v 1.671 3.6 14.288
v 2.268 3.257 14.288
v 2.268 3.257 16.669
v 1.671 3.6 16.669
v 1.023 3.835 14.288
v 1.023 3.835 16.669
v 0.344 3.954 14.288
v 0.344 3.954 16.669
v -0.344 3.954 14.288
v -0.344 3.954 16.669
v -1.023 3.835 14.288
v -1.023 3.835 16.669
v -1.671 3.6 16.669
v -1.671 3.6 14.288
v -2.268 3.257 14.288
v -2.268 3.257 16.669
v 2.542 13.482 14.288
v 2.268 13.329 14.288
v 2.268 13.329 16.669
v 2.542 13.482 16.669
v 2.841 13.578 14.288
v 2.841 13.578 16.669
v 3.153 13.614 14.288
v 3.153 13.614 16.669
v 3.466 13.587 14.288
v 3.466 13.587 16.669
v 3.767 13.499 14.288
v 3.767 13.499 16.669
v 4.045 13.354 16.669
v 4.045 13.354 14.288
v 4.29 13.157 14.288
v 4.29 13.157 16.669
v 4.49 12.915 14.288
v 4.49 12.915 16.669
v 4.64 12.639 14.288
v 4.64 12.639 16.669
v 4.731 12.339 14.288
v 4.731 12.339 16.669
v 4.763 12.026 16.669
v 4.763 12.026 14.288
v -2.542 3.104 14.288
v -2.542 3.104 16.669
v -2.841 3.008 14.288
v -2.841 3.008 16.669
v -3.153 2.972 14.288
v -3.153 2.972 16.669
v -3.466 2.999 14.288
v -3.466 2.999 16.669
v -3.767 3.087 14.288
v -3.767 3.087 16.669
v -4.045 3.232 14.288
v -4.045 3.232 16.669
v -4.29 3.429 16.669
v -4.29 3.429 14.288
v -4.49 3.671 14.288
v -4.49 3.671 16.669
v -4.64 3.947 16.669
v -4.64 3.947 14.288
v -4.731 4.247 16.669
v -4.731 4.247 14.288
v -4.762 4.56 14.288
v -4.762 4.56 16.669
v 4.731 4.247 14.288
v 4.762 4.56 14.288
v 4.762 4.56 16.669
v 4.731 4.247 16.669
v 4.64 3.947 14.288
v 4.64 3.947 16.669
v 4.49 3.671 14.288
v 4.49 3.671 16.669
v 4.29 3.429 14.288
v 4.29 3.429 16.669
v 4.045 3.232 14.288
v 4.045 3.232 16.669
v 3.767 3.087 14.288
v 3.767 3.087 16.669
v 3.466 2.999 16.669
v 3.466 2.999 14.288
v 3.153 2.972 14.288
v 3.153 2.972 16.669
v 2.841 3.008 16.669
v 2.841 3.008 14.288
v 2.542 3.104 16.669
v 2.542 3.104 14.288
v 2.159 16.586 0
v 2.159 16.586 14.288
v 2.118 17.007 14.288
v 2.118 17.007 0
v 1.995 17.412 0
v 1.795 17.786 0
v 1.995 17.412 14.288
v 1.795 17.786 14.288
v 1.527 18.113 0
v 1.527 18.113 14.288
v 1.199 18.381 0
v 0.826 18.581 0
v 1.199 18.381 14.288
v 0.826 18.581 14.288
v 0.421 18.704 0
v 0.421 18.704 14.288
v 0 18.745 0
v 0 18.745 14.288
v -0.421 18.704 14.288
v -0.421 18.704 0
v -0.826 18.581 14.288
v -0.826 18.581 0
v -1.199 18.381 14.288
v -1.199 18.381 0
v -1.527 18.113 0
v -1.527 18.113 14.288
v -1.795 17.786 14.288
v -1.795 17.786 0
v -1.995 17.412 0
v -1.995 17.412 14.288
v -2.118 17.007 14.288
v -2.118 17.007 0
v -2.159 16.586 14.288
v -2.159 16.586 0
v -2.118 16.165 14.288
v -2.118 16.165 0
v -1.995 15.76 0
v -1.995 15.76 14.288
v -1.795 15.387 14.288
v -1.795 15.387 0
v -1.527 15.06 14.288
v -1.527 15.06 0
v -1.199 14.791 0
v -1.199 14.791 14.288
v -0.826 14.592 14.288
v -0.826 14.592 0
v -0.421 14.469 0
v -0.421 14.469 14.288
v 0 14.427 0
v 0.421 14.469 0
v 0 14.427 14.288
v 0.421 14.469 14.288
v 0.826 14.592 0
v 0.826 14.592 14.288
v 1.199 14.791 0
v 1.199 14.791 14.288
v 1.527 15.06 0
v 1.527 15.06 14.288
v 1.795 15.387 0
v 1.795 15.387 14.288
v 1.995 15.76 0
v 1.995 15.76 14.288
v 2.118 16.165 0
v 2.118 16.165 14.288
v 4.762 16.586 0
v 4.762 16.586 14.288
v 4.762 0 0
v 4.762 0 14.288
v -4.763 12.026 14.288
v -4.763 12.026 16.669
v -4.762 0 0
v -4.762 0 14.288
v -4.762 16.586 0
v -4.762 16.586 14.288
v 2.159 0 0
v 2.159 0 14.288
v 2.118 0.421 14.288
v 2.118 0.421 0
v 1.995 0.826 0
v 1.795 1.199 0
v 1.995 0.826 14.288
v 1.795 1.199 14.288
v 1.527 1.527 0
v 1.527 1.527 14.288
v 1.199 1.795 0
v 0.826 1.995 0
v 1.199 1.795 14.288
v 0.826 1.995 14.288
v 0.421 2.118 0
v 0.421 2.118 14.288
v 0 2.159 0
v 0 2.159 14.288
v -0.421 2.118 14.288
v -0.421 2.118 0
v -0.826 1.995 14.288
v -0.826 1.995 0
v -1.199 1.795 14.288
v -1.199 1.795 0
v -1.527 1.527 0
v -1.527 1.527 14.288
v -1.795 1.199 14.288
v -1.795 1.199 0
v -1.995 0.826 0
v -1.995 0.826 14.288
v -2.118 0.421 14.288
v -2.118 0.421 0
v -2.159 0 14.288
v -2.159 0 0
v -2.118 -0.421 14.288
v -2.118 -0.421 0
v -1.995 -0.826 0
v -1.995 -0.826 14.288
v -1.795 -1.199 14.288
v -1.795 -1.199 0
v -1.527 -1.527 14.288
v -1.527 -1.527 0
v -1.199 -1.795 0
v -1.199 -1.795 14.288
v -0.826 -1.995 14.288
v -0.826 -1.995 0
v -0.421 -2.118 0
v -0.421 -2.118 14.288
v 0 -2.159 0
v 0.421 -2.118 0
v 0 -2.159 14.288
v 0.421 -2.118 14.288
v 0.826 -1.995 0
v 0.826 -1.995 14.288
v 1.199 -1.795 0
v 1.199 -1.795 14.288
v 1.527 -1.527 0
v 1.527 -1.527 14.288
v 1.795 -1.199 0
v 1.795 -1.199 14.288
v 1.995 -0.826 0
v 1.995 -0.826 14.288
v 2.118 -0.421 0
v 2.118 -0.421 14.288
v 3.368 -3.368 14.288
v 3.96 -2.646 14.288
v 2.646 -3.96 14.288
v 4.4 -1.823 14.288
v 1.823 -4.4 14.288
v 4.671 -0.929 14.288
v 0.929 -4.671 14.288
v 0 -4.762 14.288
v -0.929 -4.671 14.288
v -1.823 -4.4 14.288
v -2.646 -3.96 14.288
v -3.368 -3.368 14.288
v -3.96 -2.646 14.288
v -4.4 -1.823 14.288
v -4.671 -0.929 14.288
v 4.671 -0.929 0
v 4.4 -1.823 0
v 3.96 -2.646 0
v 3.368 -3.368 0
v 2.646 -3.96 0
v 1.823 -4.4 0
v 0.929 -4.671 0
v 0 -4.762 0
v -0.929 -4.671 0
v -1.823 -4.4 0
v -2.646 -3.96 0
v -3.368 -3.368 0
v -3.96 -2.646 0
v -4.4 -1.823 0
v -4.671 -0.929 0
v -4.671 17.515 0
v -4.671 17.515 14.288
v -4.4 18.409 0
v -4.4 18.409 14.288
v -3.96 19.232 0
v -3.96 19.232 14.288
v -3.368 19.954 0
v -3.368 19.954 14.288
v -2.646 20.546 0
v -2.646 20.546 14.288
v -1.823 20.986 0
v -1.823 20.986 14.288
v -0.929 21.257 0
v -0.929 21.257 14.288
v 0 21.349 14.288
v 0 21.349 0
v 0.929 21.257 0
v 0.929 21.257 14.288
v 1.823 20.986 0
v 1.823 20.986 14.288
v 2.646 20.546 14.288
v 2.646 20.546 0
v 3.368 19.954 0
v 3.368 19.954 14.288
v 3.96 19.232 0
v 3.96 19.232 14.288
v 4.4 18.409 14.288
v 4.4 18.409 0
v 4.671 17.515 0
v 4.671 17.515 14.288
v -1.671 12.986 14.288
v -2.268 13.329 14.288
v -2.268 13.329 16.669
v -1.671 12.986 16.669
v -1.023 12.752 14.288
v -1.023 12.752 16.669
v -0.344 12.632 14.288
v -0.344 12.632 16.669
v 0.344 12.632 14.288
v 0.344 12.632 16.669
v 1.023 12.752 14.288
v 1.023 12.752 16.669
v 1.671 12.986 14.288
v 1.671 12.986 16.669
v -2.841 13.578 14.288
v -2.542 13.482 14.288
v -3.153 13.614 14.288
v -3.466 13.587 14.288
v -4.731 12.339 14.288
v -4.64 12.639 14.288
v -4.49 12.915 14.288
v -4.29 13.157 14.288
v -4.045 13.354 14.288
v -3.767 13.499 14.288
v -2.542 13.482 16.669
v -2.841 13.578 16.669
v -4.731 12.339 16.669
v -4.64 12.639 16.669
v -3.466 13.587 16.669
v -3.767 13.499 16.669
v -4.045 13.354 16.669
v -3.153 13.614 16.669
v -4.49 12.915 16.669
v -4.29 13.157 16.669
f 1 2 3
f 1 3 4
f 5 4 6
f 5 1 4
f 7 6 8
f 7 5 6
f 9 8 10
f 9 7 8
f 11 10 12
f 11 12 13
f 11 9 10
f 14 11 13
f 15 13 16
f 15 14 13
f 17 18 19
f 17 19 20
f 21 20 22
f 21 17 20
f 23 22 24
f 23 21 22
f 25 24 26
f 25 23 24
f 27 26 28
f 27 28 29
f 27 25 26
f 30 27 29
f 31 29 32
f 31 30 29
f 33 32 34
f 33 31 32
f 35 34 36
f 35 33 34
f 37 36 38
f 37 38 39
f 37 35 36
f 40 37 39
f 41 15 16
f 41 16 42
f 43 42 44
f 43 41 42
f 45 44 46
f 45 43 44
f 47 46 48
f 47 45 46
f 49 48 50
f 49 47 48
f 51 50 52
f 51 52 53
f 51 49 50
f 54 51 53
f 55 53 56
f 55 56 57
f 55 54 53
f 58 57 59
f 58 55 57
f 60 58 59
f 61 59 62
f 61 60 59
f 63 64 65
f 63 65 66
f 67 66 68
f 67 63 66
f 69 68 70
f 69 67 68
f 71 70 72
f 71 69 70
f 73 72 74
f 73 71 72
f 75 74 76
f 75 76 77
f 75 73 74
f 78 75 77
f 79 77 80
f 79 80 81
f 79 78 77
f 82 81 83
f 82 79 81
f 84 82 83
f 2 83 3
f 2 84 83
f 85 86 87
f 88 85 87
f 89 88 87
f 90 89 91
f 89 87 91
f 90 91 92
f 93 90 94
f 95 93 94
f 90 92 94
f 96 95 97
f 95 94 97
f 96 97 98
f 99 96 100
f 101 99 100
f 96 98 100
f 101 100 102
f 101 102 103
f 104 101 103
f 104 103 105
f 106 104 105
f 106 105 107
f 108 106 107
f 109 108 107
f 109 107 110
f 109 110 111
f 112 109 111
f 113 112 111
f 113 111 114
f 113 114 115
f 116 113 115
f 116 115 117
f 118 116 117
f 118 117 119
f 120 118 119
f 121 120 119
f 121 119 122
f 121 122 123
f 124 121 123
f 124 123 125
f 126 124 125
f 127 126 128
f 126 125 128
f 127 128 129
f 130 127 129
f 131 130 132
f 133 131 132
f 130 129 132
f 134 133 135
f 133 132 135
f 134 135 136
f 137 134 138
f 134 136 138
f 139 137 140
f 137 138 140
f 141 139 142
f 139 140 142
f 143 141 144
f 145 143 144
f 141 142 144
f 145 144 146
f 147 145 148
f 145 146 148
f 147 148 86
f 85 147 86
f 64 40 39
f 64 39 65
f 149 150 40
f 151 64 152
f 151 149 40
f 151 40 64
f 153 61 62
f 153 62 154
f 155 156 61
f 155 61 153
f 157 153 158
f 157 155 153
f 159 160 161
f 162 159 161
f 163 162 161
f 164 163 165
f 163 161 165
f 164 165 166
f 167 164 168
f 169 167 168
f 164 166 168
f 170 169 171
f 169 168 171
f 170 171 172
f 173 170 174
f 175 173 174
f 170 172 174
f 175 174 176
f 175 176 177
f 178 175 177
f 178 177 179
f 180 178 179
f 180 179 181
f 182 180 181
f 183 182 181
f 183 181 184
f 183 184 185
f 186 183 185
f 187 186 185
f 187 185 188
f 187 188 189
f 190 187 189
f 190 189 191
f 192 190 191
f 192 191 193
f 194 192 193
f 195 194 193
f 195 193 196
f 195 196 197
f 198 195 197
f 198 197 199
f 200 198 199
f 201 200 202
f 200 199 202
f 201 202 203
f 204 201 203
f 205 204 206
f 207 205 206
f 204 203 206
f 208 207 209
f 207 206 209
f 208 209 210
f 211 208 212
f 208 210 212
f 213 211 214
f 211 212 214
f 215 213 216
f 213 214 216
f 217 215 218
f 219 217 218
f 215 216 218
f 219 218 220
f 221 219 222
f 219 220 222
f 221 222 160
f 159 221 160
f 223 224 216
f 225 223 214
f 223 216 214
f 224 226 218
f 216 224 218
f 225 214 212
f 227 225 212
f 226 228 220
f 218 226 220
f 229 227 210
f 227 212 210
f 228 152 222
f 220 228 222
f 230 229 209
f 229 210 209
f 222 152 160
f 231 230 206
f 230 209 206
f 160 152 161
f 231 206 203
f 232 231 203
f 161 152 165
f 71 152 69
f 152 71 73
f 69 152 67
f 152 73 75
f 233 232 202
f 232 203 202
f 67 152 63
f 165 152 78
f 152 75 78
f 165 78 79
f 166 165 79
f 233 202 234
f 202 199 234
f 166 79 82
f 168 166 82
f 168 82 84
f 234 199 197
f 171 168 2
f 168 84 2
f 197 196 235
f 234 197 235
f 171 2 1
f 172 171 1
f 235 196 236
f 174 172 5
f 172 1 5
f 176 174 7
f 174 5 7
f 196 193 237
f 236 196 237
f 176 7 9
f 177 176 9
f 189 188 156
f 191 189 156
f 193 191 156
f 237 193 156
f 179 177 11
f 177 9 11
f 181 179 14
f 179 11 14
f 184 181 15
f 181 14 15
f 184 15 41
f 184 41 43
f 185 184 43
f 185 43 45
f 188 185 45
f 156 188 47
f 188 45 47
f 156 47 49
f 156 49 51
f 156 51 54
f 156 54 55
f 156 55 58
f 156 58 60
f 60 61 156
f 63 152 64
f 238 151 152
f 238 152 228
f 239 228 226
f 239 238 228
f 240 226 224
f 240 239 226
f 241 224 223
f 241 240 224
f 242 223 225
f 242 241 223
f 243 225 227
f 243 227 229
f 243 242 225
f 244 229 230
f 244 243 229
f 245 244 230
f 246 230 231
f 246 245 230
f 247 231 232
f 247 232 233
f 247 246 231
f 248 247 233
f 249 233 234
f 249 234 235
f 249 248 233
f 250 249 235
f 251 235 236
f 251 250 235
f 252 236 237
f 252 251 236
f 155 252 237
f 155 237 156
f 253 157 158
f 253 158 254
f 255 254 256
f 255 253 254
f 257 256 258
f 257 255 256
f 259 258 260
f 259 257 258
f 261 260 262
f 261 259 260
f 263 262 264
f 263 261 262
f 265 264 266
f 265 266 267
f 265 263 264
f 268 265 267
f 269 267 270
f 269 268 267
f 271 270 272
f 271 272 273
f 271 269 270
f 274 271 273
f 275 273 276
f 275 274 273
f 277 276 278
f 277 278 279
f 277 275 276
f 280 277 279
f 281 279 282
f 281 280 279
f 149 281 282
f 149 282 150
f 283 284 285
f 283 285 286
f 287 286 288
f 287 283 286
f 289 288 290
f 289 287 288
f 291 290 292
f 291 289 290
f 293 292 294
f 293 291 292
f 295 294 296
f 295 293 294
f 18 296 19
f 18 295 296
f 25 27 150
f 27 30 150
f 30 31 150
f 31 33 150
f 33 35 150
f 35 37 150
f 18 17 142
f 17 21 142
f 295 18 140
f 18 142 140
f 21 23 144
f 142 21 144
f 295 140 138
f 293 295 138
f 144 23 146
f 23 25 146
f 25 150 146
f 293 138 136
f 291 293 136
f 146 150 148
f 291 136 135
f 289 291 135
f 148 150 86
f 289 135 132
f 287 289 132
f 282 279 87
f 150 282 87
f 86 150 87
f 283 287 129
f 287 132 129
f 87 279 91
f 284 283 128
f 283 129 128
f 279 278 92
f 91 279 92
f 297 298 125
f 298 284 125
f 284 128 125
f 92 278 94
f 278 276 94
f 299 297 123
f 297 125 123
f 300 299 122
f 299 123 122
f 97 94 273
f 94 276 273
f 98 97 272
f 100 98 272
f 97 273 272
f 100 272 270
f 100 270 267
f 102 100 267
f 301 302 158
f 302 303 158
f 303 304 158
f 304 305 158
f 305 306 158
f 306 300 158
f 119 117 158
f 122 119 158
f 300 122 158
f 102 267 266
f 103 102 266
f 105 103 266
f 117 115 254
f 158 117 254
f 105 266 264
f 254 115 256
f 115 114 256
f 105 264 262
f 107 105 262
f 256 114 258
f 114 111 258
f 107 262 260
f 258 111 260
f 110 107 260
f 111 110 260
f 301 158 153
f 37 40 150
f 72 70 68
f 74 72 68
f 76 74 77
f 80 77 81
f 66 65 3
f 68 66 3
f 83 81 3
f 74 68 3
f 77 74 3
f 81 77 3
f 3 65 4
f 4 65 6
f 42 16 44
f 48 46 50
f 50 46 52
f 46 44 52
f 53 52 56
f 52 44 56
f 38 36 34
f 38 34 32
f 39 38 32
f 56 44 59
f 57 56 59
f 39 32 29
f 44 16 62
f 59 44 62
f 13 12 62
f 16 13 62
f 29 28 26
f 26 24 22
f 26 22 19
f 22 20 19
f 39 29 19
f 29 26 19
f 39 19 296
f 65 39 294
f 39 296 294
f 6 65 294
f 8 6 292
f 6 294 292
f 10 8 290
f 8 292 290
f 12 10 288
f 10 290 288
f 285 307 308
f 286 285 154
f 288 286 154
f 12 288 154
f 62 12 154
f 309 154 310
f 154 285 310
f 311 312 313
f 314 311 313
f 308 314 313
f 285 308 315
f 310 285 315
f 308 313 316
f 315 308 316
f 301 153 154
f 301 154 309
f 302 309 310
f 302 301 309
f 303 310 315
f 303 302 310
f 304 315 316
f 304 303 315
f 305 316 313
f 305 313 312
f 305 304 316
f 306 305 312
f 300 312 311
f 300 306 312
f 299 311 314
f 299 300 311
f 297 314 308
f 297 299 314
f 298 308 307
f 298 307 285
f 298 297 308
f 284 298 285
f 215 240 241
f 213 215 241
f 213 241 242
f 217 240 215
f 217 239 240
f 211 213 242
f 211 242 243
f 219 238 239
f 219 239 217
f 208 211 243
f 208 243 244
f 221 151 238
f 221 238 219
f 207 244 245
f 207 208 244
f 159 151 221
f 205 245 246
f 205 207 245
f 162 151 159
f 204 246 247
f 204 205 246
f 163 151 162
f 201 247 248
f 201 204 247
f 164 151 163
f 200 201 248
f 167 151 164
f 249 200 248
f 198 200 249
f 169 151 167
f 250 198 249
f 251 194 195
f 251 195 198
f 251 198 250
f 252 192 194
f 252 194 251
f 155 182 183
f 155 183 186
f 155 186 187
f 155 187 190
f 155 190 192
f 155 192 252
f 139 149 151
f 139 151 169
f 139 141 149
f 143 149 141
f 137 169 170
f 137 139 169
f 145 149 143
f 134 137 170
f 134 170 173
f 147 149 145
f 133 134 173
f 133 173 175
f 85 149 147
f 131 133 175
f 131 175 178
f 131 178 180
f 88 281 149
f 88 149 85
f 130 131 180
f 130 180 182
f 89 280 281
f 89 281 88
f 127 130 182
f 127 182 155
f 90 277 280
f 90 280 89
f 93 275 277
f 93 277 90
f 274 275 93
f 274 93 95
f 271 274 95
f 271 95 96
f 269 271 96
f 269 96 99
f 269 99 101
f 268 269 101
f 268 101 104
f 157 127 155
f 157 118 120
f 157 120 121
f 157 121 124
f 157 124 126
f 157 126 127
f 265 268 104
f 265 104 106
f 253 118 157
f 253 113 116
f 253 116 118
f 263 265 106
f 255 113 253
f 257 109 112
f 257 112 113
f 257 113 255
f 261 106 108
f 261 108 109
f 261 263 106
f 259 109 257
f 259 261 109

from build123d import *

# Parameters (mm, degrees)
BOSS_EXTRUDE1_DEPTH = 14.2875
SKETCH4_R           = 2.159
CUT_EXTRUDE2_DEPTH  = 27.126252203
BOSS_EXTRUDE3_DEPTH = 2.38125


with BuildPart() as part:
    # Sketch1 → Boss-Extrude1 (new body)
    with BuildSketch(Plane.XY):
        with BuildLine():
            Line((-4.7625, 0), (-4.7625, 16.5862))
            ThreePointArc((-4.7625, 16.5862), (0, 21.3487), (4.7625, 16.5862))
            Line((4.7625, 16.5862), (4.7625, 0))
            ThreePointArc((4.7625, 0), (0, -4.7625), (-4.7625, 0))
        make_face()
    extrude(amount=BOSS_EXTRUDE1_DEPTH)

    # Sketch4 → Cut-Extrude2 (cut, through all)
    with BuildSketch(Plane.XY.offset(14.2875)):
        with Locations((0, 16.5862)):
            Circle(SKETCH4_R)
        Circle(SKETCH4_R)
    extrude(amount=-CUT_EXTRUDE2_DEPTH, mode=Mode.SUBTRACT)

    # Sketch5 → Boss-Extrude3 (add)
    with BuildSketch(Plane.XY.offset(14.2875)):
        with BuildLine():
            Line((-4.7625, 4.559746601), (-4.7625, 12.026453399))
            ThreePointArc((-4.7625, 12.026453399), (-3.909869704, 13.43362175), (-2.267857143, 13.329238142))
            ThreePointArc((-2.267857143, 13.329238142), (0, 12.61745), (2.267857143, 13.329238142))
            ThreePointArc((2.267857143, 13.329238142), (3.909869704, 13.43362175), (4.7625, 12.026453399))
            Line((4.7625, 12.026453399), (4.7625, 4.559746601))
            ThreePointArc((4.7625, 4.559746601), (3.909869704, 3.15257825), (2.267857143, 3.256961858))
            ThreePointArc((2.267857143, 3.256961858), (0, 3.96875), (-2.267857143, 3.256961858))
            ThreePointArc((-2.267857143, 3.256961858), (-3.909869704, 3.15257825), (-4.7625, 4.559746601))
        make_face()
    extrude(amount=BOSS_EXTRUDE3_DEPTH)


solid = part.part
